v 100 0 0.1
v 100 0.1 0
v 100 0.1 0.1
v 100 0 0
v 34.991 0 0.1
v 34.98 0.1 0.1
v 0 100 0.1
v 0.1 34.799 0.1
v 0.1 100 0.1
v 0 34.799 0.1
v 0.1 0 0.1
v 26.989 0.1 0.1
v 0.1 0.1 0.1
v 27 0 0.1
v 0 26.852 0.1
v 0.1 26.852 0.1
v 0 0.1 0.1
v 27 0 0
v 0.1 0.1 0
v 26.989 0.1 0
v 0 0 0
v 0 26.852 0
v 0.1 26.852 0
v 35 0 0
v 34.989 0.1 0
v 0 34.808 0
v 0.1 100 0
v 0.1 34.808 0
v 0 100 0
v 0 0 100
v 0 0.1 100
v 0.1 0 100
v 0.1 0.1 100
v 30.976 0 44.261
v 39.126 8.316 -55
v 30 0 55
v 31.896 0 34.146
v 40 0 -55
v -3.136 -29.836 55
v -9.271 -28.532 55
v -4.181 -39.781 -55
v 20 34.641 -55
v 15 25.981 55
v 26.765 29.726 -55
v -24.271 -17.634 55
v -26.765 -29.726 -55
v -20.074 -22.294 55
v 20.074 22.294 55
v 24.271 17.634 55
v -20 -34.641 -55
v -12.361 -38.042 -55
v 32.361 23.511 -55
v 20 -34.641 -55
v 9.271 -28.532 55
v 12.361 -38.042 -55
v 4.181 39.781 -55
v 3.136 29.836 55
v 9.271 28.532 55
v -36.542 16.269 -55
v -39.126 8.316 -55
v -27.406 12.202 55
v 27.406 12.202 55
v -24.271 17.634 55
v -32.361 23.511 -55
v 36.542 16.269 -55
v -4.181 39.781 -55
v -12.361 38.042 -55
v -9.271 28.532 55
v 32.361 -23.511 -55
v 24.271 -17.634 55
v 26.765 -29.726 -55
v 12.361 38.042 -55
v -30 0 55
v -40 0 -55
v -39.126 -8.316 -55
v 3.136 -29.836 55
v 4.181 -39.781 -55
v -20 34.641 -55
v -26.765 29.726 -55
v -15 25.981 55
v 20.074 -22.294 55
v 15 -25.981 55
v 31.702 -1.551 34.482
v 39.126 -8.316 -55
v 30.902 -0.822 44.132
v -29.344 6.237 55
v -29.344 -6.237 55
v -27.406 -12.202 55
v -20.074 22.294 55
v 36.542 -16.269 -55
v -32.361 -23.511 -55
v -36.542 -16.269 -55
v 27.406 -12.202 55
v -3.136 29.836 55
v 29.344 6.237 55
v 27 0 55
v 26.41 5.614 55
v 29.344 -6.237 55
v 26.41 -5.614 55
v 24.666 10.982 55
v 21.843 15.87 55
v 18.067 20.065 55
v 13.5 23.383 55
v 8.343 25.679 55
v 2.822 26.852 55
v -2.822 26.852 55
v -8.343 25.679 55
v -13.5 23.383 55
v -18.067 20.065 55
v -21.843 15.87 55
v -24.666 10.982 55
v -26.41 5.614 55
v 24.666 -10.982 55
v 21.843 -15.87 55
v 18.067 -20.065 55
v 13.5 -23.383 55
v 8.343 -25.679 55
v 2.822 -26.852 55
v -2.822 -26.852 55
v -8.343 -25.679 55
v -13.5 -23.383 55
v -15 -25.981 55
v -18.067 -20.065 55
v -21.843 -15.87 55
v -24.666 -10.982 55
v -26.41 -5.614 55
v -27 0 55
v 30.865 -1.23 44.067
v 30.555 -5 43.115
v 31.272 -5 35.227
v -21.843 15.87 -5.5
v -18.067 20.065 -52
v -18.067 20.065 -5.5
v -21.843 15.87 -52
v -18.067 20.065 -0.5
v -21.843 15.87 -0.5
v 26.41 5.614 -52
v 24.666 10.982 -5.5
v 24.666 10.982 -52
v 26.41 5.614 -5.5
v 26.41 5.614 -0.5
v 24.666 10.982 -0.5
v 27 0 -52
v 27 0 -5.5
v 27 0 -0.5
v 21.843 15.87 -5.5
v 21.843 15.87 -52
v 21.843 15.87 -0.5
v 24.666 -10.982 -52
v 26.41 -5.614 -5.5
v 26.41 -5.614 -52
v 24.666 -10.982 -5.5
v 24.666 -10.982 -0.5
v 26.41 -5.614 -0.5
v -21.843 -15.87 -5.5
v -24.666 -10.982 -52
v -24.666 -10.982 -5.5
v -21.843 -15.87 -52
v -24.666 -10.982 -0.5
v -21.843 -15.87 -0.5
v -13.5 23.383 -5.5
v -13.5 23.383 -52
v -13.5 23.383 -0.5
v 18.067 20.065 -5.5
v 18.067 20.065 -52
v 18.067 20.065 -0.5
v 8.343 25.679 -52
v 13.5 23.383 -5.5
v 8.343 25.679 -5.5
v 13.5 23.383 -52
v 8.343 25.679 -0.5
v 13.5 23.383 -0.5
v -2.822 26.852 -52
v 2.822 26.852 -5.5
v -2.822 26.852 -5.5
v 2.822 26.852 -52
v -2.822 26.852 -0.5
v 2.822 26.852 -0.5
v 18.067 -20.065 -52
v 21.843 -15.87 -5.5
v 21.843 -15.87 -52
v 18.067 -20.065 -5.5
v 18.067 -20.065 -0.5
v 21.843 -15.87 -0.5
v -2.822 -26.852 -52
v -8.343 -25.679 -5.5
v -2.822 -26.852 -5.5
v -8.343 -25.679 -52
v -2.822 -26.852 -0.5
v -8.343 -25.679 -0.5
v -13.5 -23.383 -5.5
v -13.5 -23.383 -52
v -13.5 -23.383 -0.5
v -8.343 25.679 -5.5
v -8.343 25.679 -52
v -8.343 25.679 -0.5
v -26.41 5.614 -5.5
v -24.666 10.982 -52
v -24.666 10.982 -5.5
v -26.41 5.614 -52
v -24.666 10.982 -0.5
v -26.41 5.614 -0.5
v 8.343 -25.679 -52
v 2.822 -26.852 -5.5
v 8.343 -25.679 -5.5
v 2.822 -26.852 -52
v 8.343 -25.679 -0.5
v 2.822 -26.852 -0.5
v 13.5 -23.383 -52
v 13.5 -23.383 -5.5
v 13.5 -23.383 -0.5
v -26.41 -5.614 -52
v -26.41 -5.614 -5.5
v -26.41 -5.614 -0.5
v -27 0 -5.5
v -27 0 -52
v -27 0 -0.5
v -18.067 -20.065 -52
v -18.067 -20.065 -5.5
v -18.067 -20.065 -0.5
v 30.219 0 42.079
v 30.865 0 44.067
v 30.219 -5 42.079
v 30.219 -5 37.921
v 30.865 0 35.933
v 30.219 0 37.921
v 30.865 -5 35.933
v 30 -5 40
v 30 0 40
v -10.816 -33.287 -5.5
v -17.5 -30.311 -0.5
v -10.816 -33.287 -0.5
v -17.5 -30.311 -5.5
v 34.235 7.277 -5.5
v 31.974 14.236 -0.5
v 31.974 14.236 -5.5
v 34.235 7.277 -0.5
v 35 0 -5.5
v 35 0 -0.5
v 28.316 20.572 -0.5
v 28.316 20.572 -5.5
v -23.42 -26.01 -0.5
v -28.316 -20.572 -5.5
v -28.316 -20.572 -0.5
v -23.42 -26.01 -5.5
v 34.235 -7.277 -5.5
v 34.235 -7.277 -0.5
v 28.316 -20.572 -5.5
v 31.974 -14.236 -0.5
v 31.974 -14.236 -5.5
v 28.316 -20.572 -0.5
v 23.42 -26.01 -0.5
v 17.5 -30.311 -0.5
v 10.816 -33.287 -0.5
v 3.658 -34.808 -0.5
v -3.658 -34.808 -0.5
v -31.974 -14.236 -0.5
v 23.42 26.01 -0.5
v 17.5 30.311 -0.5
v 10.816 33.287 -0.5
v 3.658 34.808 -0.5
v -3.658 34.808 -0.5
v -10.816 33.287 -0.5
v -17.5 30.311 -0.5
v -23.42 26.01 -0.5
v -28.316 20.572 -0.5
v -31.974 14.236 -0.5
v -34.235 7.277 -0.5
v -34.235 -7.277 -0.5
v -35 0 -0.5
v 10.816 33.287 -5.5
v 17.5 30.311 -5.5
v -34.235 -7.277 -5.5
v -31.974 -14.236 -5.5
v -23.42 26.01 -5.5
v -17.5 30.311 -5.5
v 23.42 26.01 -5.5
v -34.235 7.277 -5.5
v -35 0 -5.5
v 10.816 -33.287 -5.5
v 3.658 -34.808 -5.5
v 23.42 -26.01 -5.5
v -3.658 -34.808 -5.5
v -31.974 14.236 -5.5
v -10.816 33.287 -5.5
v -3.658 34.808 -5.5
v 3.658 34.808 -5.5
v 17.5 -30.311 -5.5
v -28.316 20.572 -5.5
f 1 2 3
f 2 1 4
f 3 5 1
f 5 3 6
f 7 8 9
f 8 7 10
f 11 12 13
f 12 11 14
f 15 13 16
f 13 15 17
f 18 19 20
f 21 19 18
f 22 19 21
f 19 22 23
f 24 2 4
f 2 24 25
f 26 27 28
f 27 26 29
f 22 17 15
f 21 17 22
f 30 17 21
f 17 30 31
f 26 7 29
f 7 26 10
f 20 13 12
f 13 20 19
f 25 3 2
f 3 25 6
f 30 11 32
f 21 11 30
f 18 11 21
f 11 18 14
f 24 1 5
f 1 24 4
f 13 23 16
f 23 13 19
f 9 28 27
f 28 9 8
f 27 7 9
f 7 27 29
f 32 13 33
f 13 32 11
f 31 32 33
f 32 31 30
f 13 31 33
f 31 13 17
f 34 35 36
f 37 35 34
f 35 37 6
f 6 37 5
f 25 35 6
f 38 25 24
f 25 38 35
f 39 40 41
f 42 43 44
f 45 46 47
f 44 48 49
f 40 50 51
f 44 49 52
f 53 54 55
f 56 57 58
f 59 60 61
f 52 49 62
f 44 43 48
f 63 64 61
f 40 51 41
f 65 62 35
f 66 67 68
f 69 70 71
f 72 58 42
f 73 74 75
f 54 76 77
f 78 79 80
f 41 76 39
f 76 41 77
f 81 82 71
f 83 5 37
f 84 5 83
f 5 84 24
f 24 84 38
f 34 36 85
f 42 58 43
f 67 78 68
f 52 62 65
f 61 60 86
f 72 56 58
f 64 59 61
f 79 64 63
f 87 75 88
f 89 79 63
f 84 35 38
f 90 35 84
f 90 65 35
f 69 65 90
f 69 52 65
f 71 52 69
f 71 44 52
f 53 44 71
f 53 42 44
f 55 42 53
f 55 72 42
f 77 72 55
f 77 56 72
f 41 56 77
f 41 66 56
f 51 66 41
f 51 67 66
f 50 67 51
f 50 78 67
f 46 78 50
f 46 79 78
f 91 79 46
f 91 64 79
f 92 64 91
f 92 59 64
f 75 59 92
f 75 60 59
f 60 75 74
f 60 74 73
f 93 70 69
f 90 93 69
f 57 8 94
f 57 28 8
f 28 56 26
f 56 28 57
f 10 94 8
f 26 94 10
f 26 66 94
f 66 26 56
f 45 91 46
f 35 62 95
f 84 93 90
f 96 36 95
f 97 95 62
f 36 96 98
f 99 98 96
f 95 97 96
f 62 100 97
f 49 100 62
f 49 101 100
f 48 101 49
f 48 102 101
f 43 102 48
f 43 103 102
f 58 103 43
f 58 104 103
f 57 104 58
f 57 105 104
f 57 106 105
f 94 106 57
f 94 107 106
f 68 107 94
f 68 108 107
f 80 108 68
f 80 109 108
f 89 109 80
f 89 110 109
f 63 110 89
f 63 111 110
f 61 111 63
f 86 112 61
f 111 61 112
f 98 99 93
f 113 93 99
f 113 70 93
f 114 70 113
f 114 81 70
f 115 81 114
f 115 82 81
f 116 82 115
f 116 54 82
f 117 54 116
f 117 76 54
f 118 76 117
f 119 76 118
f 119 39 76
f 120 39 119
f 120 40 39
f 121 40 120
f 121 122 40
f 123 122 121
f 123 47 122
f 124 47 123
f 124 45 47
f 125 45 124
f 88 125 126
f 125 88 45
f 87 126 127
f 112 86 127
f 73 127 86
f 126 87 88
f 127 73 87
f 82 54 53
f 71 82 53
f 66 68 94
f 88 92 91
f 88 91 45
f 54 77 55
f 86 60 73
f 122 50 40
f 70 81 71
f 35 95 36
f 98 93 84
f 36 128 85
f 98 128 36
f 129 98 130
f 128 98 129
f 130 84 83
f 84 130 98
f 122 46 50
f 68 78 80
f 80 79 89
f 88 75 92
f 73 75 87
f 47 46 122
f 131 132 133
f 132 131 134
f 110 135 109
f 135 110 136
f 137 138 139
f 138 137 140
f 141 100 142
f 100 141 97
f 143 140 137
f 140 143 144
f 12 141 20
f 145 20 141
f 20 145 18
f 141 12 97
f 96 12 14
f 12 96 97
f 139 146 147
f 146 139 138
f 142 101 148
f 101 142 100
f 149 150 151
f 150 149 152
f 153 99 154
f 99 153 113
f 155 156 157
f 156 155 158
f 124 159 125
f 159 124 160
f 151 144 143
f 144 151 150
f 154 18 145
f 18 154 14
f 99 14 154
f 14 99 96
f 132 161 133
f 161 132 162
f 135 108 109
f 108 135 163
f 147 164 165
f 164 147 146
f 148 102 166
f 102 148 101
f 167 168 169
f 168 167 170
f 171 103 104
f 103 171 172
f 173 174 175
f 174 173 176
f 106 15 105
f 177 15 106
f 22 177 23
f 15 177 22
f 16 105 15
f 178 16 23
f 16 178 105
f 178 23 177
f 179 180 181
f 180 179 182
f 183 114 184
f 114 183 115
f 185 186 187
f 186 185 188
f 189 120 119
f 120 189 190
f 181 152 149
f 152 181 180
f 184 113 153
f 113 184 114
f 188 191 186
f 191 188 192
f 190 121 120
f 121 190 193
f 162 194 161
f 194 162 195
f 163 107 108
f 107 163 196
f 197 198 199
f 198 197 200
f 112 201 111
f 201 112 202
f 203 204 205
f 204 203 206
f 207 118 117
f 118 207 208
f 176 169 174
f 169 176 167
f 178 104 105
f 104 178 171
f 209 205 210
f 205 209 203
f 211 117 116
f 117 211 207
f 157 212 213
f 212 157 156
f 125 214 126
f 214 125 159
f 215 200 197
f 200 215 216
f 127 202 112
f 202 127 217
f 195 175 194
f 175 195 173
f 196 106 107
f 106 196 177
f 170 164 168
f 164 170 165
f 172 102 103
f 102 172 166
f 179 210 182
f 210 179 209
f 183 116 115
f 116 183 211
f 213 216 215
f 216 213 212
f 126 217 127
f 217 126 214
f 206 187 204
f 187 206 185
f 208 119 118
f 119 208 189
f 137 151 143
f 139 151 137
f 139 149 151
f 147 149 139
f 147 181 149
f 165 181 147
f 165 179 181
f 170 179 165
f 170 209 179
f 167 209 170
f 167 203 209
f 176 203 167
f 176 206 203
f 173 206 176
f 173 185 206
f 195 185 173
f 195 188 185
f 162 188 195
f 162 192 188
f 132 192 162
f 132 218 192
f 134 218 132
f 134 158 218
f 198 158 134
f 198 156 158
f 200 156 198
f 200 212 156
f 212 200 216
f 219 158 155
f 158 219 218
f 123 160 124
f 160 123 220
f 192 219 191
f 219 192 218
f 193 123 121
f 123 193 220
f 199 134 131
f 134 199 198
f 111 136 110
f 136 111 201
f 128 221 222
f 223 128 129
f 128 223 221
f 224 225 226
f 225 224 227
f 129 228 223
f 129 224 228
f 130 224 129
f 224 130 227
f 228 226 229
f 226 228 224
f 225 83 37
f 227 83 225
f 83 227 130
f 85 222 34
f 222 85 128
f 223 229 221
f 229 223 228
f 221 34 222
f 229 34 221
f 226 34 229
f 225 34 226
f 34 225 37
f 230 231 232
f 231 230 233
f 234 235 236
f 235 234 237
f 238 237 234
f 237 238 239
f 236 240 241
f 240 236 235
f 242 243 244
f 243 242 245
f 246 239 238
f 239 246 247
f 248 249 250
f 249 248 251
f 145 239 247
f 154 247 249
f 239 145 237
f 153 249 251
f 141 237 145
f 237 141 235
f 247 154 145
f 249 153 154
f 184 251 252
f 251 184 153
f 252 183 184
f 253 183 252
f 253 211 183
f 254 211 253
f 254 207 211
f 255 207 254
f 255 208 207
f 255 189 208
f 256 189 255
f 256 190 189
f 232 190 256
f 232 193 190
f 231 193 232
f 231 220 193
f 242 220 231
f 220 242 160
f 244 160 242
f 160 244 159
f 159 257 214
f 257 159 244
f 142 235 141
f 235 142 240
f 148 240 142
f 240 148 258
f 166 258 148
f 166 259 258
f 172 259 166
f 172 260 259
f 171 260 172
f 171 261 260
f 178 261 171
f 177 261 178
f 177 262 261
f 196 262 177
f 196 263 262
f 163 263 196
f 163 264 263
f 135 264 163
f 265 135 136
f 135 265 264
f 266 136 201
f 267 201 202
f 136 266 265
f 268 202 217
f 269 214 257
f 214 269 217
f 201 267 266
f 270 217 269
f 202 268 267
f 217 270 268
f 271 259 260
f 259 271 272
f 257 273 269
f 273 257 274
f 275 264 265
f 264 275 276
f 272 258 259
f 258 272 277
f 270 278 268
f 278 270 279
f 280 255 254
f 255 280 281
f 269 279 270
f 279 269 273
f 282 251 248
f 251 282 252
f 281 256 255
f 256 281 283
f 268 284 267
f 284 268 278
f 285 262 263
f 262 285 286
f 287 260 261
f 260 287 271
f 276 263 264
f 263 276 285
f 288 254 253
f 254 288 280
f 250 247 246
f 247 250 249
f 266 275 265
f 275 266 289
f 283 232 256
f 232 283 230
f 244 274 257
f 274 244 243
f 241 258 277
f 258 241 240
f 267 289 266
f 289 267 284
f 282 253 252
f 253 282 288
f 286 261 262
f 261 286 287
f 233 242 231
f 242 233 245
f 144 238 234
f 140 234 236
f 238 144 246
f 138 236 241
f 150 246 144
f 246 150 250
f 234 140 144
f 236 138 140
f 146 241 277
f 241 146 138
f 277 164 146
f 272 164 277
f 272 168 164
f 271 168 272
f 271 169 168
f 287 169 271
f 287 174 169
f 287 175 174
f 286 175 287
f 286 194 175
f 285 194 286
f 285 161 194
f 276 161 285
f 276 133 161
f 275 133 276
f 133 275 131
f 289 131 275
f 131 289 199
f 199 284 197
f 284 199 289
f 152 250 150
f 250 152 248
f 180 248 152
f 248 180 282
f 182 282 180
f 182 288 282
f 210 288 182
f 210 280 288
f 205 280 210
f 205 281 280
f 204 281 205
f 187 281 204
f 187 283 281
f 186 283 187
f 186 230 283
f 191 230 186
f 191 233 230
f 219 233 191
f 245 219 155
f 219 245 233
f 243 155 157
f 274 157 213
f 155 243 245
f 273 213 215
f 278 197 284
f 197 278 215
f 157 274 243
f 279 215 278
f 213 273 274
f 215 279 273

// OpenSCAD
    // Combined Scene

    // Permanent Model
    
    // Permanent Model (Black)
    color([0, 0, 0]) {
        // Your permanent model code here
        cube([100,0.1,0.1], center = false);
        cube([0.1,100,0.1], center = false);
        cube([0.1,0.1,100], center = false);
    }
    

    // Dynamic Model
    difference() {
    // Main mug body
    difference() {
        // Outer shape with a wider top and narrower bottom
        cylinder(h=110, r1=40, r2=30, center=true);
        // Inner hollow space for fluid containment with 3 mm wall thickness
        translate([0, 0, 2])
            cylinder(h=108, r=27, center=true);
    }

    // Handle of the mug
    translate([40, 0, 40])
        rotate([90, 0, 0])
            difference() {
                // Outer part of handle
                scale([1, 1, 0.5])
                    cylinder(h=20, r=10, center=true);
                
                // Inner cutout of handle
                translate([-6, 0, -10])
                    scale([1, 1, 0.5])
                        cylinder(h=40, r=7, center=true);
            }

    // Rounded base for stability
    translate([0, 0, -3])
        cylinder(h=5, r=35, center=true);

    // Flared rim for comfort
    translate([0, 0, 110])
        cylinder(h=5, r=43, center=true);
    translate([0, 0, 105])
        cylinder(h=5, r=32, center=true);
    
    // Texturing for grip (optional pattern)
    for (i = [-1:1:1]) {
        translate([0, i * 1.5, 0])
            linear_extrude(height=110)
                offset(r=0.5)
                    polygon(points=[[25,-3], [25,3], [26,3], [26,-3]]);
    }
}
    
